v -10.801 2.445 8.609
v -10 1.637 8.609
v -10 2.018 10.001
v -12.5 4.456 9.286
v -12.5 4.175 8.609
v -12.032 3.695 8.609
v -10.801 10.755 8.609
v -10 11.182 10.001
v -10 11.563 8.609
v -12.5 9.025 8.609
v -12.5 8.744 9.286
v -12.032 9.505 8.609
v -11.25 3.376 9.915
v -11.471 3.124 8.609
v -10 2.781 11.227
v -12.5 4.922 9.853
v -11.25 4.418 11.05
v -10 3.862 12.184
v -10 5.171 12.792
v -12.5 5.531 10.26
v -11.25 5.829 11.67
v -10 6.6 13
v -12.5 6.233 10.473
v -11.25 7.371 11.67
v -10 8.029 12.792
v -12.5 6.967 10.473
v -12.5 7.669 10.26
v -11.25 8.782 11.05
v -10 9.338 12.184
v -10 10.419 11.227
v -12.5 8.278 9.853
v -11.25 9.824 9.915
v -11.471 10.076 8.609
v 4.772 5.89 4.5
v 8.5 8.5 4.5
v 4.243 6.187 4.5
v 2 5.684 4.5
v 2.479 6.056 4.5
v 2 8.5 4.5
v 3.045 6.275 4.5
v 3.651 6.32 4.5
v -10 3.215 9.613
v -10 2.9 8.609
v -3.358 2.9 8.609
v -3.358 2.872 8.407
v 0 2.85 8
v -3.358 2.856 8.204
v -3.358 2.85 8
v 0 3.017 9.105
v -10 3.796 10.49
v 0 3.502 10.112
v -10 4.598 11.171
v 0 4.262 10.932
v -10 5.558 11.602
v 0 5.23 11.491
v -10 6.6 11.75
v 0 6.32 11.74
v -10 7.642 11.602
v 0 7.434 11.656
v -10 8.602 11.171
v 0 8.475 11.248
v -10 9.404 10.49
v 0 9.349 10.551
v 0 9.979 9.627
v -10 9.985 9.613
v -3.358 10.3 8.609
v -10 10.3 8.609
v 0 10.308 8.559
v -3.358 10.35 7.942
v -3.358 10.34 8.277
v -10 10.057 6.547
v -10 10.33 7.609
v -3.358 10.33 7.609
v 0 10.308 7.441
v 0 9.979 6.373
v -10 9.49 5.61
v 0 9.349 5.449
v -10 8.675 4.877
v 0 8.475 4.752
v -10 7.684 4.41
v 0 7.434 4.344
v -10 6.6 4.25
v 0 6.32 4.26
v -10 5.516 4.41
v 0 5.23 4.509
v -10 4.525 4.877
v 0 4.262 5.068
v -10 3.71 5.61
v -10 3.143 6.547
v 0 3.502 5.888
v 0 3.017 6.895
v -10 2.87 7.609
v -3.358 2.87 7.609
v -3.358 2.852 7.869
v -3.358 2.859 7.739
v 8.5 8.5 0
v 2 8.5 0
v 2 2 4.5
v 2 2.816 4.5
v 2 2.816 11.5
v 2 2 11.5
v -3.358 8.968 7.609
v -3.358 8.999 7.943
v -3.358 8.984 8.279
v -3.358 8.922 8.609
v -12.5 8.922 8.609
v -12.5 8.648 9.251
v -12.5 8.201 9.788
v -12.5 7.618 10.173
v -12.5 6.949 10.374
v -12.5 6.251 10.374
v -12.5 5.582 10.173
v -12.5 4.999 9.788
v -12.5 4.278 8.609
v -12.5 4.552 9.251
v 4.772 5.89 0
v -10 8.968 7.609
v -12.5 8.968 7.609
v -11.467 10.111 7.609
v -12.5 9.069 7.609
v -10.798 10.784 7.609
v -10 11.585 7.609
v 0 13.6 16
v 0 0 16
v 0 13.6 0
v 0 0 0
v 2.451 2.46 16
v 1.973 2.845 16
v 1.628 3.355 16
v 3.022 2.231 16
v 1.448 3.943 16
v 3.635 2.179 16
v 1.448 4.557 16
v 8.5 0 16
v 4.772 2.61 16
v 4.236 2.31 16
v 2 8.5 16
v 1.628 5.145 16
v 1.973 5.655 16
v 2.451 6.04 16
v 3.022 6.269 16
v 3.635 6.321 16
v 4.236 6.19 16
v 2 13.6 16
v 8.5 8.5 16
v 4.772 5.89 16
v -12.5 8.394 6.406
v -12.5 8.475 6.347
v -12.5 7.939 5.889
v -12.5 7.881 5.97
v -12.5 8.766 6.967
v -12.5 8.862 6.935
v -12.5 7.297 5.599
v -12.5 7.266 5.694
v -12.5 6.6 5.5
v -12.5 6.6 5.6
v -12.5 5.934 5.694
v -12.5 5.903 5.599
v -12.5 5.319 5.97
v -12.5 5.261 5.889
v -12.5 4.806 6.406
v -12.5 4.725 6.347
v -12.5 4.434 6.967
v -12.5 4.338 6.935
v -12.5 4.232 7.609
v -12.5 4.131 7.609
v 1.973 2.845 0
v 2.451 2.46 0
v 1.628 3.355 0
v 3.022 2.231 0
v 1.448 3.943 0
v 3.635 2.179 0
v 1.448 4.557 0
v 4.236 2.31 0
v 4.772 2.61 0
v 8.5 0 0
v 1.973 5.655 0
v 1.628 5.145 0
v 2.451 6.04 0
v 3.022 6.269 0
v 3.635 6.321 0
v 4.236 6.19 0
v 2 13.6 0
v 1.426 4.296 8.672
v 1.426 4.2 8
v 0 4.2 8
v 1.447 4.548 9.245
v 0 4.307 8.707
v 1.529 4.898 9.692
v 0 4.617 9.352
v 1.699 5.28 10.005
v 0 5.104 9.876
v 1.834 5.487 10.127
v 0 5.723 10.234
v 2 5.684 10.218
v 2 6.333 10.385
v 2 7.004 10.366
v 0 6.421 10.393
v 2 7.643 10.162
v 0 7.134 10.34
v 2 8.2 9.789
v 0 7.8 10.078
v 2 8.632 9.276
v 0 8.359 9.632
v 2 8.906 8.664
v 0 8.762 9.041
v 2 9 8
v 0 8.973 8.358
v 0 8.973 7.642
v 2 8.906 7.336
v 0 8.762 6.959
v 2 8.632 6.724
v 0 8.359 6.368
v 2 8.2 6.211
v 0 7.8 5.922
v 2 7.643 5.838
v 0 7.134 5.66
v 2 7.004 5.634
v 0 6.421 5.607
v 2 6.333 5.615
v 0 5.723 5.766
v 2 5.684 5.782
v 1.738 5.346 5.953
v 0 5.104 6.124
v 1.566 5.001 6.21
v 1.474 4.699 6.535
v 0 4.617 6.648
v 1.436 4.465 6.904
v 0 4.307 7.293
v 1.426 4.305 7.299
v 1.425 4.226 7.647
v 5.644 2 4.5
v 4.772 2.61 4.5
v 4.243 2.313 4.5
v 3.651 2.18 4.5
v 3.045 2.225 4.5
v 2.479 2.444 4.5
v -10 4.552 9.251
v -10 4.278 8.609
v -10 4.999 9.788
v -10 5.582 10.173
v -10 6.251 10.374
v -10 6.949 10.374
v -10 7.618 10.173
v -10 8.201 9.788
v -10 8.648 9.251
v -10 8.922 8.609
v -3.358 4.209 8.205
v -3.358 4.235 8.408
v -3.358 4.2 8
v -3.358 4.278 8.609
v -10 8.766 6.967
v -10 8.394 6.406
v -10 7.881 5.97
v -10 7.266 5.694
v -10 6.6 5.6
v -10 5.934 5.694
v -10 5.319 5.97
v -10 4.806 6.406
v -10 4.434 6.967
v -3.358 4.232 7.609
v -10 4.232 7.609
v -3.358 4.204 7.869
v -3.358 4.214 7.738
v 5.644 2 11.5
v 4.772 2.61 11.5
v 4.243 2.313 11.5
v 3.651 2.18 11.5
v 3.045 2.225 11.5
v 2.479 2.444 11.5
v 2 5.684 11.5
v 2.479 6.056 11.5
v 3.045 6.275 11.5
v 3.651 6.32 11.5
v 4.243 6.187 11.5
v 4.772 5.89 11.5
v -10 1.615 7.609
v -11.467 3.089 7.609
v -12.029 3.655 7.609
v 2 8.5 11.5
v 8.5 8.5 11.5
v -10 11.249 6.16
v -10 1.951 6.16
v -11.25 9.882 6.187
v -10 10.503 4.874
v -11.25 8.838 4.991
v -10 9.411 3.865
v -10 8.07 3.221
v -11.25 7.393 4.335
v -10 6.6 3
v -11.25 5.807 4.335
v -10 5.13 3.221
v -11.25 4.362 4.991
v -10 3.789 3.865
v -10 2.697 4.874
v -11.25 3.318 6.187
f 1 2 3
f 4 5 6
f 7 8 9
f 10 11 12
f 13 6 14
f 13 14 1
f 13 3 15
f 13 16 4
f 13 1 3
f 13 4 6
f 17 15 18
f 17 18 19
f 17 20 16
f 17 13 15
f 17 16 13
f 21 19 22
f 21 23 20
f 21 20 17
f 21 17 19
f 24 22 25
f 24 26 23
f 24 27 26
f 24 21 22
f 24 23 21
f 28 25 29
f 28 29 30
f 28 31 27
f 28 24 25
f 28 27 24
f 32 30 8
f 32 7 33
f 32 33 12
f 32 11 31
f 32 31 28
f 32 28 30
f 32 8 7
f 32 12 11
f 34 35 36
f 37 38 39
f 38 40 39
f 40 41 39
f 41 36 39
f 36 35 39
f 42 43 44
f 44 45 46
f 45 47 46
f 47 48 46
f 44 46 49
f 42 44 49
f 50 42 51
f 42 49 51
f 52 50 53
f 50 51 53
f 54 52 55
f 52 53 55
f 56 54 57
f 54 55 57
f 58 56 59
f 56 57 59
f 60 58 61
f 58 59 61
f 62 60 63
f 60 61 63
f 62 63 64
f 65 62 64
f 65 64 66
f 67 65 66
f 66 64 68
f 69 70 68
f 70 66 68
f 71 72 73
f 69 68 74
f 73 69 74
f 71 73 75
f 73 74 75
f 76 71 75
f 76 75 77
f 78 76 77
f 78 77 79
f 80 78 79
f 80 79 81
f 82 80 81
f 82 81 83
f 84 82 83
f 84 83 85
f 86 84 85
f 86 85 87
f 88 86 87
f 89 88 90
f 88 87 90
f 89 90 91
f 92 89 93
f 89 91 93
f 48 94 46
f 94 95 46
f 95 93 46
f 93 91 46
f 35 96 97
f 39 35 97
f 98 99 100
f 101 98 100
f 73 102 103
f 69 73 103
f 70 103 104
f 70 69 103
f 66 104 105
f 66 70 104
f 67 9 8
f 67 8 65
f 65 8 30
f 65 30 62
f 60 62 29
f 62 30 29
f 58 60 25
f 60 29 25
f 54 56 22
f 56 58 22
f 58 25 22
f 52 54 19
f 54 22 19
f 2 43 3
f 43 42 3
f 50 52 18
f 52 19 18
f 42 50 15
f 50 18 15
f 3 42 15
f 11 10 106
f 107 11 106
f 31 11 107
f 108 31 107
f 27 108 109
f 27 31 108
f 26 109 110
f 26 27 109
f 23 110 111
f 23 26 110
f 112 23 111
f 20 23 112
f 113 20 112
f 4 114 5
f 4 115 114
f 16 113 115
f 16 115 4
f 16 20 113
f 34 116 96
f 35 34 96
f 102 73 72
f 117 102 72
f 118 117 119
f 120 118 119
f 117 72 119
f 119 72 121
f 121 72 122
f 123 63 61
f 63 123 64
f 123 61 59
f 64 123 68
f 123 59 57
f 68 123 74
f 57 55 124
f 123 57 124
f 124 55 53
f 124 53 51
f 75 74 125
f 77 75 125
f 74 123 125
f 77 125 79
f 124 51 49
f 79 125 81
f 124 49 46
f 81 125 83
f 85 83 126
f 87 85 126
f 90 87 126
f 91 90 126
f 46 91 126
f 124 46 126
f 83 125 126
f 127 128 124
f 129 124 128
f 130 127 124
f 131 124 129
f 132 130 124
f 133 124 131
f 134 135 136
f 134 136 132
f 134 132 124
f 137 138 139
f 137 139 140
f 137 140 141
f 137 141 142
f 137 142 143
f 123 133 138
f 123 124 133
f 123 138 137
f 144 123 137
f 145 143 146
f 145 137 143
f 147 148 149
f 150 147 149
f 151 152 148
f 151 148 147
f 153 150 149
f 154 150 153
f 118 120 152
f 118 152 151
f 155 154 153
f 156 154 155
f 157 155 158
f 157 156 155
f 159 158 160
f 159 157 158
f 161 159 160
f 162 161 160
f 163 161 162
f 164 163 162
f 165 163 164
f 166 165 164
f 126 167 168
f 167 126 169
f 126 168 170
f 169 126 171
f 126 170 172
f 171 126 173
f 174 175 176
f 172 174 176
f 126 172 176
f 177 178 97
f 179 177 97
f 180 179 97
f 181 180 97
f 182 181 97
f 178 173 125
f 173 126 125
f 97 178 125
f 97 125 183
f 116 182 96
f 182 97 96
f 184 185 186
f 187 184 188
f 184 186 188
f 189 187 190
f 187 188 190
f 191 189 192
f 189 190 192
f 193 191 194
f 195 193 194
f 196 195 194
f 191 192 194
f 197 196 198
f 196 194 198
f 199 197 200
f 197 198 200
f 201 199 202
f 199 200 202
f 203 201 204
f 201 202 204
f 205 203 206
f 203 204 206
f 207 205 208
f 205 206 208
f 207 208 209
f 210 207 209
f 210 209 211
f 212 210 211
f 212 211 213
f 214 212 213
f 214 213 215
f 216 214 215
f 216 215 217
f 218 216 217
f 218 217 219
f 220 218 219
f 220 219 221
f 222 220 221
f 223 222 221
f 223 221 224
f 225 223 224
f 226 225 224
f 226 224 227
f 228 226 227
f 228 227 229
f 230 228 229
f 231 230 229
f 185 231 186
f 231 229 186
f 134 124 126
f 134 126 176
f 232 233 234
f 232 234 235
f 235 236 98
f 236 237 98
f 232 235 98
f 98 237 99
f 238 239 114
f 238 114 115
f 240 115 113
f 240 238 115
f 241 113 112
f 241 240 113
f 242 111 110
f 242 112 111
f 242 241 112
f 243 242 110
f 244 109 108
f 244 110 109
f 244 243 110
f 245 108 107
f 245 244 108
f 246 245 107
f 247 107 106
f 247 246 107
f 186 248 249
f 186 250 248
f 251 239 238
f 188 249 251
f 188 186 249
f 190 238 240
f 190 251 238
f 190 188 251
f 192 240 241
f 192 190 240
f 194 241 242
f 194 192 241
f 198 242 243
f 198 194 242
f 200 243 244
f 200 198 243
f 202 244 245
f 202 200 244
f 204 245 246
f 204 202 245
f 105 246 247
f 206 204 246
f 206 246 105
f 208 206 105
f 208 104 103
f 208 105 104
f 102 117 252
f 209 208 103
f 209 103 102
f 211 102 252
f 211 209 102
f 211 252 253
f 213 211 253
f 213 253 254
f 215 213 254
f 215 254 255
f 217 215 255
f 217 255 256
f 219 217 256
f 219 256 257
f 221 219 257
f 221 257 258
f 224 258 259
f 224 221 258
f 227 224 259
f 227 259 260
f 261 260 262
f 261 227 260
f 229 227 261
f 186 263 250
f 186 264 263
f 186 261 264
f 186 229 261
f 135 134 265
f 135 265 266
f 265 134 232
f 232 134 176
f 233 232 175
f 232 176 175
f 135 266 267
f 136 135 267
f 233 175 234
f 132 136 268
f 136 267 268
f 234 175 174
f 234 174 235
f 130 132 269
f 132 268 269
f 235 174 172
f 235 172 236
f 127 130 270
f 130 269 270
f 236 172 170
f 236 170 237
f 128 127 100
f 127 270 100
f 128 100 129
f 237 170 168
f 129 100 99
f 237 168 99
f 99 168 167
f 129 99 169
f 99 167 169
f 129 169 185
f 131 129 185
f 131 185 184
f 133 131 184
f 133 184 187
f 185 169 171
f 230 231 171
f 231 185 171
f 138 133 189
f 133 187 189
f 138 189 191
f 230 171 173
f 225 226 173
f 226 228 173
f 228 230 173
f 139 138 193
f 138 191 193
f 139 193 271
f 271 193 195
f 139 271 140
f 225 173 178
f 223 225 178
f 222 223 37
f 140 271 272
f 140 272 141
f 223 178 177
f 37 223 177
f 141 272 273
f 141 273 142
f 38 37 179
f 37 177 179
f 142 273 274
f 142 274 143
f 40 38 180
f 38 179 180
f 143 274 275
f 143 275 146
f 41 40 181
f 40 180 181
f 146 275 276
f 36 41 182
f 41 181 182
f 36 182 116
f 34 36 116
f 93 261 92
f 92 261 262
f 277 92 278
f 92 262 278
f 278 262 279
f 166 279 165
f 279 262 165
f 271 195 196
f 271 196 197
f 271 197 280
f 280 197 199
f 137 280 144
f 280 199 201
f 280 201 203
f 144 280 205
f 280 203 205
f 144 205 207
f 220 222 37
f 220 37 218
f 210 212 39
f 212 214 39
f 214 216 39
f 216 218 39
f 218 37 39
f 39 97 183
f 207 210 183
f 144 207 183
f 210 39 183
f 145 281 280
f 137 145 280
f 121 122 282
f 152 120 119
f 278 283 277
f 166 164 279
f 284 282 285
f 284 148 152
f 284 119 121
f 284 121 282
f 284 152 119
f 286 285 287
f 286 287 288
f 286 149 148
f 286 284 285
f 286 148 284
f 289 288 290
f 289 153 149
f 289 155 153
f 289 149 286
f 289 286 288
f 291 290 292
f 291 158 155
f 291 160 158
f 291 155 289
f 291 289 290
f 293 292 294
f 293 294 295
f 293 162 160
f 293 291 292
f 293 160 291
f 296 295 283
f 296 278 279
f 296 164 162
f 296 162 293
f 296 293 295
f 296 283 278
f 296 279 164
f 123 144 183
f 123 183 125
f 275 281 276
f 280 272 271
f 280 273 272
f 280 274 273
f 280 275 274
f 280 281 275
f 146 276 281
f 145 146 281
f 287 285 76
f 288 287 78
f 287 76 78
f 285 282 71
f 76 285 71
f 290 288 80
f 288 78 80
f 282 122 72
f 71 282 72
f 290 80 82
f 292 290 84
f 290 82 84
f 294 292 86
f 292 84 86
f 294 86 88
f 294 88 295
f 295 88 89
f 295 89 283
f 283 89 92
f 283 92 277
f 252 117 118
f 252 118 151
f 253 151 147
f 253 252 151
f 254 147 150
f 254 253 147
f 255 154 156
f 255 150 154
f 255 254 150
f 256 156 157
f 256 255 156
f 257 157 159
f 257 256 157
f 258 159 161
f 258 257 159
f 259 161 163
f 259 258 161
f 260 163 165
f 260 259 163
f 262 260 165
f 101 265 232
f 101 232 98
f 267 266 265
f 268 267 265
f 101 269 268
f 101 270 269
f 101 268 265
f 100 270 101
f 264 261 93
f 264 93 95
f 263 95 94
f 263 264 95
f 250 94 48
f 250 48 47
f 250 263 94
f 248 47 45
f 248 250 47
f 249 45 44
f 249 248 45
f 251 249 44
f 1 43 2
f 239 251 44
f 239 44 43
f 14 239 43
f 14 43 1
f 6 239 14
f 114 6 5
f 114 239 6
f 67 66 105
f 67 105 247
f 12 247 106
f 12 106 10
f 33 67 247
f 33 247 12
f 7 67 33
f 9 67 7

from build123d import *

# Parameters (mm, degrees)
F1_DEPTH  = 16
F2_W      = 6.5
F2_H      = 7
F3_DEPTH  = 6.5
F4_R      = 3.75
F4_R_2    = 2.4
F5_DEPTH  = 10
F6_DEPTH  = 8
F7_R      = 5
F8_DEPTH  = 2.5
F9_DEPTH  = 5
F10_SIZE2 = 2.49999
F10_SIZE  = 2.49999
F11_W     = 9.2321852261
F11_H     = 1
F12_DEPTH = 25


# Not quite as in the source:
# - a fillet or chamfer is up to 0.001 mm smaller than in the source, because OpenCascade refuses the exact size


with BuildPart() as f1:
    # F0 (on Top) → F1 (new body)
    with BuildSketch(Plane.XY):
        with BuildLine():
            Line((2, 13.6), (0, 13.6))
            Line((0, 13.6), (0, 0))
            Line((0, 0), (8.5, 0))
            Line((8.5, 0), (4.7718484698, 2.610479805))
            ThreePointArc((4.7718484698, 2.610479805), (1.425, 4.25), (4.7718484698, 5.889520195))
            Line((4.7718484698, 5.889520195), (8.5, 8.5))
            Line((8.5, 8.5), (2, 8.5))
            Line((2, 8.5), (2, 13.6))
        make_face()
    extrude(amount=F1_DEPTH)

    # F2 (on face) → F3 (cut)
    with BuildSketch(Plane(origin=(0, 8.5, 0), x_dir=(-1, 0, 0), z_dir=(0, 1, 0))):
        with Locations((-5.25, 8)):
            Rectangle(F2_W, F2_H)
    extrude(amount=-F3_DEPTH, mode=Mode.SUBTRACT)

    # F4 (on face) → F5 (join)
    with BuildSketch(Plane(origin=(0, 0, 0), x_dir=(0, -1, 0), z_dir=(-1, 0, 0))):
        with Locations((-6.6, 8)):
            Circle(F4_R)
        with Locations((-6.6, 8)):
            Circle(F4_R_2, mode=Mode.SUBTRACT)
    extrude(amount=F5_DEPTH)

    # F6 (cut): a face of the model
    f6_faces = [f1.faces().sort_by_distance(p)[0] for p in [
        (0, 6.6, 8),
    ]]
    extrude(f6_faces, amount=-F6_DEPTH, mode=Mode.SUBTRACT)

    # F7 (on face) → F8 (join)
    with BuildSketch(Plane(origin=(-10, 0, 0), x_dir=(0, -1, 0), z_dir=(-1, 0, 0))):
        with Locations((-6.6, 8)):
            Circle(F7_R)
    extrude(amount=F8_DEPTH)

    # F9 (cut): a face of the model
    f9_faces = [f1.faces().sort_by_distance(p)[0] for p in [
        (-10, 6.6, 8),
    ]]
    extrude(f9_faces, amount=-F9_DEPTH, mode=Mode.SUBTRACT)

    # F10 (size 2.5 and 2.5 in the source; OpenCascade refuses exactly that, so slightly less here)
    f10_edges = [f1.edges().sort_by_distance(p)[0] for p in [
        (-12.5, 11.6, 8),
    ]]
    chamfer(f10_edges, length=F10_SIZE, length2=F10_SIZE2)

    # F11 (on face) → F12 (cut)
    with BuildSketch(Plane(origin=(0, 13.6, 0), x_dir=(-1, 0, 0), z_dir=(0, 1, 0))):
        with Locations((7.9738140339, 8.1086927094)):
            Rectangle(F11_W, F11_H)
    extrude(amount=-F12_DEPTH, mode=Mode.SUBTRACT)


solid = f1.part
